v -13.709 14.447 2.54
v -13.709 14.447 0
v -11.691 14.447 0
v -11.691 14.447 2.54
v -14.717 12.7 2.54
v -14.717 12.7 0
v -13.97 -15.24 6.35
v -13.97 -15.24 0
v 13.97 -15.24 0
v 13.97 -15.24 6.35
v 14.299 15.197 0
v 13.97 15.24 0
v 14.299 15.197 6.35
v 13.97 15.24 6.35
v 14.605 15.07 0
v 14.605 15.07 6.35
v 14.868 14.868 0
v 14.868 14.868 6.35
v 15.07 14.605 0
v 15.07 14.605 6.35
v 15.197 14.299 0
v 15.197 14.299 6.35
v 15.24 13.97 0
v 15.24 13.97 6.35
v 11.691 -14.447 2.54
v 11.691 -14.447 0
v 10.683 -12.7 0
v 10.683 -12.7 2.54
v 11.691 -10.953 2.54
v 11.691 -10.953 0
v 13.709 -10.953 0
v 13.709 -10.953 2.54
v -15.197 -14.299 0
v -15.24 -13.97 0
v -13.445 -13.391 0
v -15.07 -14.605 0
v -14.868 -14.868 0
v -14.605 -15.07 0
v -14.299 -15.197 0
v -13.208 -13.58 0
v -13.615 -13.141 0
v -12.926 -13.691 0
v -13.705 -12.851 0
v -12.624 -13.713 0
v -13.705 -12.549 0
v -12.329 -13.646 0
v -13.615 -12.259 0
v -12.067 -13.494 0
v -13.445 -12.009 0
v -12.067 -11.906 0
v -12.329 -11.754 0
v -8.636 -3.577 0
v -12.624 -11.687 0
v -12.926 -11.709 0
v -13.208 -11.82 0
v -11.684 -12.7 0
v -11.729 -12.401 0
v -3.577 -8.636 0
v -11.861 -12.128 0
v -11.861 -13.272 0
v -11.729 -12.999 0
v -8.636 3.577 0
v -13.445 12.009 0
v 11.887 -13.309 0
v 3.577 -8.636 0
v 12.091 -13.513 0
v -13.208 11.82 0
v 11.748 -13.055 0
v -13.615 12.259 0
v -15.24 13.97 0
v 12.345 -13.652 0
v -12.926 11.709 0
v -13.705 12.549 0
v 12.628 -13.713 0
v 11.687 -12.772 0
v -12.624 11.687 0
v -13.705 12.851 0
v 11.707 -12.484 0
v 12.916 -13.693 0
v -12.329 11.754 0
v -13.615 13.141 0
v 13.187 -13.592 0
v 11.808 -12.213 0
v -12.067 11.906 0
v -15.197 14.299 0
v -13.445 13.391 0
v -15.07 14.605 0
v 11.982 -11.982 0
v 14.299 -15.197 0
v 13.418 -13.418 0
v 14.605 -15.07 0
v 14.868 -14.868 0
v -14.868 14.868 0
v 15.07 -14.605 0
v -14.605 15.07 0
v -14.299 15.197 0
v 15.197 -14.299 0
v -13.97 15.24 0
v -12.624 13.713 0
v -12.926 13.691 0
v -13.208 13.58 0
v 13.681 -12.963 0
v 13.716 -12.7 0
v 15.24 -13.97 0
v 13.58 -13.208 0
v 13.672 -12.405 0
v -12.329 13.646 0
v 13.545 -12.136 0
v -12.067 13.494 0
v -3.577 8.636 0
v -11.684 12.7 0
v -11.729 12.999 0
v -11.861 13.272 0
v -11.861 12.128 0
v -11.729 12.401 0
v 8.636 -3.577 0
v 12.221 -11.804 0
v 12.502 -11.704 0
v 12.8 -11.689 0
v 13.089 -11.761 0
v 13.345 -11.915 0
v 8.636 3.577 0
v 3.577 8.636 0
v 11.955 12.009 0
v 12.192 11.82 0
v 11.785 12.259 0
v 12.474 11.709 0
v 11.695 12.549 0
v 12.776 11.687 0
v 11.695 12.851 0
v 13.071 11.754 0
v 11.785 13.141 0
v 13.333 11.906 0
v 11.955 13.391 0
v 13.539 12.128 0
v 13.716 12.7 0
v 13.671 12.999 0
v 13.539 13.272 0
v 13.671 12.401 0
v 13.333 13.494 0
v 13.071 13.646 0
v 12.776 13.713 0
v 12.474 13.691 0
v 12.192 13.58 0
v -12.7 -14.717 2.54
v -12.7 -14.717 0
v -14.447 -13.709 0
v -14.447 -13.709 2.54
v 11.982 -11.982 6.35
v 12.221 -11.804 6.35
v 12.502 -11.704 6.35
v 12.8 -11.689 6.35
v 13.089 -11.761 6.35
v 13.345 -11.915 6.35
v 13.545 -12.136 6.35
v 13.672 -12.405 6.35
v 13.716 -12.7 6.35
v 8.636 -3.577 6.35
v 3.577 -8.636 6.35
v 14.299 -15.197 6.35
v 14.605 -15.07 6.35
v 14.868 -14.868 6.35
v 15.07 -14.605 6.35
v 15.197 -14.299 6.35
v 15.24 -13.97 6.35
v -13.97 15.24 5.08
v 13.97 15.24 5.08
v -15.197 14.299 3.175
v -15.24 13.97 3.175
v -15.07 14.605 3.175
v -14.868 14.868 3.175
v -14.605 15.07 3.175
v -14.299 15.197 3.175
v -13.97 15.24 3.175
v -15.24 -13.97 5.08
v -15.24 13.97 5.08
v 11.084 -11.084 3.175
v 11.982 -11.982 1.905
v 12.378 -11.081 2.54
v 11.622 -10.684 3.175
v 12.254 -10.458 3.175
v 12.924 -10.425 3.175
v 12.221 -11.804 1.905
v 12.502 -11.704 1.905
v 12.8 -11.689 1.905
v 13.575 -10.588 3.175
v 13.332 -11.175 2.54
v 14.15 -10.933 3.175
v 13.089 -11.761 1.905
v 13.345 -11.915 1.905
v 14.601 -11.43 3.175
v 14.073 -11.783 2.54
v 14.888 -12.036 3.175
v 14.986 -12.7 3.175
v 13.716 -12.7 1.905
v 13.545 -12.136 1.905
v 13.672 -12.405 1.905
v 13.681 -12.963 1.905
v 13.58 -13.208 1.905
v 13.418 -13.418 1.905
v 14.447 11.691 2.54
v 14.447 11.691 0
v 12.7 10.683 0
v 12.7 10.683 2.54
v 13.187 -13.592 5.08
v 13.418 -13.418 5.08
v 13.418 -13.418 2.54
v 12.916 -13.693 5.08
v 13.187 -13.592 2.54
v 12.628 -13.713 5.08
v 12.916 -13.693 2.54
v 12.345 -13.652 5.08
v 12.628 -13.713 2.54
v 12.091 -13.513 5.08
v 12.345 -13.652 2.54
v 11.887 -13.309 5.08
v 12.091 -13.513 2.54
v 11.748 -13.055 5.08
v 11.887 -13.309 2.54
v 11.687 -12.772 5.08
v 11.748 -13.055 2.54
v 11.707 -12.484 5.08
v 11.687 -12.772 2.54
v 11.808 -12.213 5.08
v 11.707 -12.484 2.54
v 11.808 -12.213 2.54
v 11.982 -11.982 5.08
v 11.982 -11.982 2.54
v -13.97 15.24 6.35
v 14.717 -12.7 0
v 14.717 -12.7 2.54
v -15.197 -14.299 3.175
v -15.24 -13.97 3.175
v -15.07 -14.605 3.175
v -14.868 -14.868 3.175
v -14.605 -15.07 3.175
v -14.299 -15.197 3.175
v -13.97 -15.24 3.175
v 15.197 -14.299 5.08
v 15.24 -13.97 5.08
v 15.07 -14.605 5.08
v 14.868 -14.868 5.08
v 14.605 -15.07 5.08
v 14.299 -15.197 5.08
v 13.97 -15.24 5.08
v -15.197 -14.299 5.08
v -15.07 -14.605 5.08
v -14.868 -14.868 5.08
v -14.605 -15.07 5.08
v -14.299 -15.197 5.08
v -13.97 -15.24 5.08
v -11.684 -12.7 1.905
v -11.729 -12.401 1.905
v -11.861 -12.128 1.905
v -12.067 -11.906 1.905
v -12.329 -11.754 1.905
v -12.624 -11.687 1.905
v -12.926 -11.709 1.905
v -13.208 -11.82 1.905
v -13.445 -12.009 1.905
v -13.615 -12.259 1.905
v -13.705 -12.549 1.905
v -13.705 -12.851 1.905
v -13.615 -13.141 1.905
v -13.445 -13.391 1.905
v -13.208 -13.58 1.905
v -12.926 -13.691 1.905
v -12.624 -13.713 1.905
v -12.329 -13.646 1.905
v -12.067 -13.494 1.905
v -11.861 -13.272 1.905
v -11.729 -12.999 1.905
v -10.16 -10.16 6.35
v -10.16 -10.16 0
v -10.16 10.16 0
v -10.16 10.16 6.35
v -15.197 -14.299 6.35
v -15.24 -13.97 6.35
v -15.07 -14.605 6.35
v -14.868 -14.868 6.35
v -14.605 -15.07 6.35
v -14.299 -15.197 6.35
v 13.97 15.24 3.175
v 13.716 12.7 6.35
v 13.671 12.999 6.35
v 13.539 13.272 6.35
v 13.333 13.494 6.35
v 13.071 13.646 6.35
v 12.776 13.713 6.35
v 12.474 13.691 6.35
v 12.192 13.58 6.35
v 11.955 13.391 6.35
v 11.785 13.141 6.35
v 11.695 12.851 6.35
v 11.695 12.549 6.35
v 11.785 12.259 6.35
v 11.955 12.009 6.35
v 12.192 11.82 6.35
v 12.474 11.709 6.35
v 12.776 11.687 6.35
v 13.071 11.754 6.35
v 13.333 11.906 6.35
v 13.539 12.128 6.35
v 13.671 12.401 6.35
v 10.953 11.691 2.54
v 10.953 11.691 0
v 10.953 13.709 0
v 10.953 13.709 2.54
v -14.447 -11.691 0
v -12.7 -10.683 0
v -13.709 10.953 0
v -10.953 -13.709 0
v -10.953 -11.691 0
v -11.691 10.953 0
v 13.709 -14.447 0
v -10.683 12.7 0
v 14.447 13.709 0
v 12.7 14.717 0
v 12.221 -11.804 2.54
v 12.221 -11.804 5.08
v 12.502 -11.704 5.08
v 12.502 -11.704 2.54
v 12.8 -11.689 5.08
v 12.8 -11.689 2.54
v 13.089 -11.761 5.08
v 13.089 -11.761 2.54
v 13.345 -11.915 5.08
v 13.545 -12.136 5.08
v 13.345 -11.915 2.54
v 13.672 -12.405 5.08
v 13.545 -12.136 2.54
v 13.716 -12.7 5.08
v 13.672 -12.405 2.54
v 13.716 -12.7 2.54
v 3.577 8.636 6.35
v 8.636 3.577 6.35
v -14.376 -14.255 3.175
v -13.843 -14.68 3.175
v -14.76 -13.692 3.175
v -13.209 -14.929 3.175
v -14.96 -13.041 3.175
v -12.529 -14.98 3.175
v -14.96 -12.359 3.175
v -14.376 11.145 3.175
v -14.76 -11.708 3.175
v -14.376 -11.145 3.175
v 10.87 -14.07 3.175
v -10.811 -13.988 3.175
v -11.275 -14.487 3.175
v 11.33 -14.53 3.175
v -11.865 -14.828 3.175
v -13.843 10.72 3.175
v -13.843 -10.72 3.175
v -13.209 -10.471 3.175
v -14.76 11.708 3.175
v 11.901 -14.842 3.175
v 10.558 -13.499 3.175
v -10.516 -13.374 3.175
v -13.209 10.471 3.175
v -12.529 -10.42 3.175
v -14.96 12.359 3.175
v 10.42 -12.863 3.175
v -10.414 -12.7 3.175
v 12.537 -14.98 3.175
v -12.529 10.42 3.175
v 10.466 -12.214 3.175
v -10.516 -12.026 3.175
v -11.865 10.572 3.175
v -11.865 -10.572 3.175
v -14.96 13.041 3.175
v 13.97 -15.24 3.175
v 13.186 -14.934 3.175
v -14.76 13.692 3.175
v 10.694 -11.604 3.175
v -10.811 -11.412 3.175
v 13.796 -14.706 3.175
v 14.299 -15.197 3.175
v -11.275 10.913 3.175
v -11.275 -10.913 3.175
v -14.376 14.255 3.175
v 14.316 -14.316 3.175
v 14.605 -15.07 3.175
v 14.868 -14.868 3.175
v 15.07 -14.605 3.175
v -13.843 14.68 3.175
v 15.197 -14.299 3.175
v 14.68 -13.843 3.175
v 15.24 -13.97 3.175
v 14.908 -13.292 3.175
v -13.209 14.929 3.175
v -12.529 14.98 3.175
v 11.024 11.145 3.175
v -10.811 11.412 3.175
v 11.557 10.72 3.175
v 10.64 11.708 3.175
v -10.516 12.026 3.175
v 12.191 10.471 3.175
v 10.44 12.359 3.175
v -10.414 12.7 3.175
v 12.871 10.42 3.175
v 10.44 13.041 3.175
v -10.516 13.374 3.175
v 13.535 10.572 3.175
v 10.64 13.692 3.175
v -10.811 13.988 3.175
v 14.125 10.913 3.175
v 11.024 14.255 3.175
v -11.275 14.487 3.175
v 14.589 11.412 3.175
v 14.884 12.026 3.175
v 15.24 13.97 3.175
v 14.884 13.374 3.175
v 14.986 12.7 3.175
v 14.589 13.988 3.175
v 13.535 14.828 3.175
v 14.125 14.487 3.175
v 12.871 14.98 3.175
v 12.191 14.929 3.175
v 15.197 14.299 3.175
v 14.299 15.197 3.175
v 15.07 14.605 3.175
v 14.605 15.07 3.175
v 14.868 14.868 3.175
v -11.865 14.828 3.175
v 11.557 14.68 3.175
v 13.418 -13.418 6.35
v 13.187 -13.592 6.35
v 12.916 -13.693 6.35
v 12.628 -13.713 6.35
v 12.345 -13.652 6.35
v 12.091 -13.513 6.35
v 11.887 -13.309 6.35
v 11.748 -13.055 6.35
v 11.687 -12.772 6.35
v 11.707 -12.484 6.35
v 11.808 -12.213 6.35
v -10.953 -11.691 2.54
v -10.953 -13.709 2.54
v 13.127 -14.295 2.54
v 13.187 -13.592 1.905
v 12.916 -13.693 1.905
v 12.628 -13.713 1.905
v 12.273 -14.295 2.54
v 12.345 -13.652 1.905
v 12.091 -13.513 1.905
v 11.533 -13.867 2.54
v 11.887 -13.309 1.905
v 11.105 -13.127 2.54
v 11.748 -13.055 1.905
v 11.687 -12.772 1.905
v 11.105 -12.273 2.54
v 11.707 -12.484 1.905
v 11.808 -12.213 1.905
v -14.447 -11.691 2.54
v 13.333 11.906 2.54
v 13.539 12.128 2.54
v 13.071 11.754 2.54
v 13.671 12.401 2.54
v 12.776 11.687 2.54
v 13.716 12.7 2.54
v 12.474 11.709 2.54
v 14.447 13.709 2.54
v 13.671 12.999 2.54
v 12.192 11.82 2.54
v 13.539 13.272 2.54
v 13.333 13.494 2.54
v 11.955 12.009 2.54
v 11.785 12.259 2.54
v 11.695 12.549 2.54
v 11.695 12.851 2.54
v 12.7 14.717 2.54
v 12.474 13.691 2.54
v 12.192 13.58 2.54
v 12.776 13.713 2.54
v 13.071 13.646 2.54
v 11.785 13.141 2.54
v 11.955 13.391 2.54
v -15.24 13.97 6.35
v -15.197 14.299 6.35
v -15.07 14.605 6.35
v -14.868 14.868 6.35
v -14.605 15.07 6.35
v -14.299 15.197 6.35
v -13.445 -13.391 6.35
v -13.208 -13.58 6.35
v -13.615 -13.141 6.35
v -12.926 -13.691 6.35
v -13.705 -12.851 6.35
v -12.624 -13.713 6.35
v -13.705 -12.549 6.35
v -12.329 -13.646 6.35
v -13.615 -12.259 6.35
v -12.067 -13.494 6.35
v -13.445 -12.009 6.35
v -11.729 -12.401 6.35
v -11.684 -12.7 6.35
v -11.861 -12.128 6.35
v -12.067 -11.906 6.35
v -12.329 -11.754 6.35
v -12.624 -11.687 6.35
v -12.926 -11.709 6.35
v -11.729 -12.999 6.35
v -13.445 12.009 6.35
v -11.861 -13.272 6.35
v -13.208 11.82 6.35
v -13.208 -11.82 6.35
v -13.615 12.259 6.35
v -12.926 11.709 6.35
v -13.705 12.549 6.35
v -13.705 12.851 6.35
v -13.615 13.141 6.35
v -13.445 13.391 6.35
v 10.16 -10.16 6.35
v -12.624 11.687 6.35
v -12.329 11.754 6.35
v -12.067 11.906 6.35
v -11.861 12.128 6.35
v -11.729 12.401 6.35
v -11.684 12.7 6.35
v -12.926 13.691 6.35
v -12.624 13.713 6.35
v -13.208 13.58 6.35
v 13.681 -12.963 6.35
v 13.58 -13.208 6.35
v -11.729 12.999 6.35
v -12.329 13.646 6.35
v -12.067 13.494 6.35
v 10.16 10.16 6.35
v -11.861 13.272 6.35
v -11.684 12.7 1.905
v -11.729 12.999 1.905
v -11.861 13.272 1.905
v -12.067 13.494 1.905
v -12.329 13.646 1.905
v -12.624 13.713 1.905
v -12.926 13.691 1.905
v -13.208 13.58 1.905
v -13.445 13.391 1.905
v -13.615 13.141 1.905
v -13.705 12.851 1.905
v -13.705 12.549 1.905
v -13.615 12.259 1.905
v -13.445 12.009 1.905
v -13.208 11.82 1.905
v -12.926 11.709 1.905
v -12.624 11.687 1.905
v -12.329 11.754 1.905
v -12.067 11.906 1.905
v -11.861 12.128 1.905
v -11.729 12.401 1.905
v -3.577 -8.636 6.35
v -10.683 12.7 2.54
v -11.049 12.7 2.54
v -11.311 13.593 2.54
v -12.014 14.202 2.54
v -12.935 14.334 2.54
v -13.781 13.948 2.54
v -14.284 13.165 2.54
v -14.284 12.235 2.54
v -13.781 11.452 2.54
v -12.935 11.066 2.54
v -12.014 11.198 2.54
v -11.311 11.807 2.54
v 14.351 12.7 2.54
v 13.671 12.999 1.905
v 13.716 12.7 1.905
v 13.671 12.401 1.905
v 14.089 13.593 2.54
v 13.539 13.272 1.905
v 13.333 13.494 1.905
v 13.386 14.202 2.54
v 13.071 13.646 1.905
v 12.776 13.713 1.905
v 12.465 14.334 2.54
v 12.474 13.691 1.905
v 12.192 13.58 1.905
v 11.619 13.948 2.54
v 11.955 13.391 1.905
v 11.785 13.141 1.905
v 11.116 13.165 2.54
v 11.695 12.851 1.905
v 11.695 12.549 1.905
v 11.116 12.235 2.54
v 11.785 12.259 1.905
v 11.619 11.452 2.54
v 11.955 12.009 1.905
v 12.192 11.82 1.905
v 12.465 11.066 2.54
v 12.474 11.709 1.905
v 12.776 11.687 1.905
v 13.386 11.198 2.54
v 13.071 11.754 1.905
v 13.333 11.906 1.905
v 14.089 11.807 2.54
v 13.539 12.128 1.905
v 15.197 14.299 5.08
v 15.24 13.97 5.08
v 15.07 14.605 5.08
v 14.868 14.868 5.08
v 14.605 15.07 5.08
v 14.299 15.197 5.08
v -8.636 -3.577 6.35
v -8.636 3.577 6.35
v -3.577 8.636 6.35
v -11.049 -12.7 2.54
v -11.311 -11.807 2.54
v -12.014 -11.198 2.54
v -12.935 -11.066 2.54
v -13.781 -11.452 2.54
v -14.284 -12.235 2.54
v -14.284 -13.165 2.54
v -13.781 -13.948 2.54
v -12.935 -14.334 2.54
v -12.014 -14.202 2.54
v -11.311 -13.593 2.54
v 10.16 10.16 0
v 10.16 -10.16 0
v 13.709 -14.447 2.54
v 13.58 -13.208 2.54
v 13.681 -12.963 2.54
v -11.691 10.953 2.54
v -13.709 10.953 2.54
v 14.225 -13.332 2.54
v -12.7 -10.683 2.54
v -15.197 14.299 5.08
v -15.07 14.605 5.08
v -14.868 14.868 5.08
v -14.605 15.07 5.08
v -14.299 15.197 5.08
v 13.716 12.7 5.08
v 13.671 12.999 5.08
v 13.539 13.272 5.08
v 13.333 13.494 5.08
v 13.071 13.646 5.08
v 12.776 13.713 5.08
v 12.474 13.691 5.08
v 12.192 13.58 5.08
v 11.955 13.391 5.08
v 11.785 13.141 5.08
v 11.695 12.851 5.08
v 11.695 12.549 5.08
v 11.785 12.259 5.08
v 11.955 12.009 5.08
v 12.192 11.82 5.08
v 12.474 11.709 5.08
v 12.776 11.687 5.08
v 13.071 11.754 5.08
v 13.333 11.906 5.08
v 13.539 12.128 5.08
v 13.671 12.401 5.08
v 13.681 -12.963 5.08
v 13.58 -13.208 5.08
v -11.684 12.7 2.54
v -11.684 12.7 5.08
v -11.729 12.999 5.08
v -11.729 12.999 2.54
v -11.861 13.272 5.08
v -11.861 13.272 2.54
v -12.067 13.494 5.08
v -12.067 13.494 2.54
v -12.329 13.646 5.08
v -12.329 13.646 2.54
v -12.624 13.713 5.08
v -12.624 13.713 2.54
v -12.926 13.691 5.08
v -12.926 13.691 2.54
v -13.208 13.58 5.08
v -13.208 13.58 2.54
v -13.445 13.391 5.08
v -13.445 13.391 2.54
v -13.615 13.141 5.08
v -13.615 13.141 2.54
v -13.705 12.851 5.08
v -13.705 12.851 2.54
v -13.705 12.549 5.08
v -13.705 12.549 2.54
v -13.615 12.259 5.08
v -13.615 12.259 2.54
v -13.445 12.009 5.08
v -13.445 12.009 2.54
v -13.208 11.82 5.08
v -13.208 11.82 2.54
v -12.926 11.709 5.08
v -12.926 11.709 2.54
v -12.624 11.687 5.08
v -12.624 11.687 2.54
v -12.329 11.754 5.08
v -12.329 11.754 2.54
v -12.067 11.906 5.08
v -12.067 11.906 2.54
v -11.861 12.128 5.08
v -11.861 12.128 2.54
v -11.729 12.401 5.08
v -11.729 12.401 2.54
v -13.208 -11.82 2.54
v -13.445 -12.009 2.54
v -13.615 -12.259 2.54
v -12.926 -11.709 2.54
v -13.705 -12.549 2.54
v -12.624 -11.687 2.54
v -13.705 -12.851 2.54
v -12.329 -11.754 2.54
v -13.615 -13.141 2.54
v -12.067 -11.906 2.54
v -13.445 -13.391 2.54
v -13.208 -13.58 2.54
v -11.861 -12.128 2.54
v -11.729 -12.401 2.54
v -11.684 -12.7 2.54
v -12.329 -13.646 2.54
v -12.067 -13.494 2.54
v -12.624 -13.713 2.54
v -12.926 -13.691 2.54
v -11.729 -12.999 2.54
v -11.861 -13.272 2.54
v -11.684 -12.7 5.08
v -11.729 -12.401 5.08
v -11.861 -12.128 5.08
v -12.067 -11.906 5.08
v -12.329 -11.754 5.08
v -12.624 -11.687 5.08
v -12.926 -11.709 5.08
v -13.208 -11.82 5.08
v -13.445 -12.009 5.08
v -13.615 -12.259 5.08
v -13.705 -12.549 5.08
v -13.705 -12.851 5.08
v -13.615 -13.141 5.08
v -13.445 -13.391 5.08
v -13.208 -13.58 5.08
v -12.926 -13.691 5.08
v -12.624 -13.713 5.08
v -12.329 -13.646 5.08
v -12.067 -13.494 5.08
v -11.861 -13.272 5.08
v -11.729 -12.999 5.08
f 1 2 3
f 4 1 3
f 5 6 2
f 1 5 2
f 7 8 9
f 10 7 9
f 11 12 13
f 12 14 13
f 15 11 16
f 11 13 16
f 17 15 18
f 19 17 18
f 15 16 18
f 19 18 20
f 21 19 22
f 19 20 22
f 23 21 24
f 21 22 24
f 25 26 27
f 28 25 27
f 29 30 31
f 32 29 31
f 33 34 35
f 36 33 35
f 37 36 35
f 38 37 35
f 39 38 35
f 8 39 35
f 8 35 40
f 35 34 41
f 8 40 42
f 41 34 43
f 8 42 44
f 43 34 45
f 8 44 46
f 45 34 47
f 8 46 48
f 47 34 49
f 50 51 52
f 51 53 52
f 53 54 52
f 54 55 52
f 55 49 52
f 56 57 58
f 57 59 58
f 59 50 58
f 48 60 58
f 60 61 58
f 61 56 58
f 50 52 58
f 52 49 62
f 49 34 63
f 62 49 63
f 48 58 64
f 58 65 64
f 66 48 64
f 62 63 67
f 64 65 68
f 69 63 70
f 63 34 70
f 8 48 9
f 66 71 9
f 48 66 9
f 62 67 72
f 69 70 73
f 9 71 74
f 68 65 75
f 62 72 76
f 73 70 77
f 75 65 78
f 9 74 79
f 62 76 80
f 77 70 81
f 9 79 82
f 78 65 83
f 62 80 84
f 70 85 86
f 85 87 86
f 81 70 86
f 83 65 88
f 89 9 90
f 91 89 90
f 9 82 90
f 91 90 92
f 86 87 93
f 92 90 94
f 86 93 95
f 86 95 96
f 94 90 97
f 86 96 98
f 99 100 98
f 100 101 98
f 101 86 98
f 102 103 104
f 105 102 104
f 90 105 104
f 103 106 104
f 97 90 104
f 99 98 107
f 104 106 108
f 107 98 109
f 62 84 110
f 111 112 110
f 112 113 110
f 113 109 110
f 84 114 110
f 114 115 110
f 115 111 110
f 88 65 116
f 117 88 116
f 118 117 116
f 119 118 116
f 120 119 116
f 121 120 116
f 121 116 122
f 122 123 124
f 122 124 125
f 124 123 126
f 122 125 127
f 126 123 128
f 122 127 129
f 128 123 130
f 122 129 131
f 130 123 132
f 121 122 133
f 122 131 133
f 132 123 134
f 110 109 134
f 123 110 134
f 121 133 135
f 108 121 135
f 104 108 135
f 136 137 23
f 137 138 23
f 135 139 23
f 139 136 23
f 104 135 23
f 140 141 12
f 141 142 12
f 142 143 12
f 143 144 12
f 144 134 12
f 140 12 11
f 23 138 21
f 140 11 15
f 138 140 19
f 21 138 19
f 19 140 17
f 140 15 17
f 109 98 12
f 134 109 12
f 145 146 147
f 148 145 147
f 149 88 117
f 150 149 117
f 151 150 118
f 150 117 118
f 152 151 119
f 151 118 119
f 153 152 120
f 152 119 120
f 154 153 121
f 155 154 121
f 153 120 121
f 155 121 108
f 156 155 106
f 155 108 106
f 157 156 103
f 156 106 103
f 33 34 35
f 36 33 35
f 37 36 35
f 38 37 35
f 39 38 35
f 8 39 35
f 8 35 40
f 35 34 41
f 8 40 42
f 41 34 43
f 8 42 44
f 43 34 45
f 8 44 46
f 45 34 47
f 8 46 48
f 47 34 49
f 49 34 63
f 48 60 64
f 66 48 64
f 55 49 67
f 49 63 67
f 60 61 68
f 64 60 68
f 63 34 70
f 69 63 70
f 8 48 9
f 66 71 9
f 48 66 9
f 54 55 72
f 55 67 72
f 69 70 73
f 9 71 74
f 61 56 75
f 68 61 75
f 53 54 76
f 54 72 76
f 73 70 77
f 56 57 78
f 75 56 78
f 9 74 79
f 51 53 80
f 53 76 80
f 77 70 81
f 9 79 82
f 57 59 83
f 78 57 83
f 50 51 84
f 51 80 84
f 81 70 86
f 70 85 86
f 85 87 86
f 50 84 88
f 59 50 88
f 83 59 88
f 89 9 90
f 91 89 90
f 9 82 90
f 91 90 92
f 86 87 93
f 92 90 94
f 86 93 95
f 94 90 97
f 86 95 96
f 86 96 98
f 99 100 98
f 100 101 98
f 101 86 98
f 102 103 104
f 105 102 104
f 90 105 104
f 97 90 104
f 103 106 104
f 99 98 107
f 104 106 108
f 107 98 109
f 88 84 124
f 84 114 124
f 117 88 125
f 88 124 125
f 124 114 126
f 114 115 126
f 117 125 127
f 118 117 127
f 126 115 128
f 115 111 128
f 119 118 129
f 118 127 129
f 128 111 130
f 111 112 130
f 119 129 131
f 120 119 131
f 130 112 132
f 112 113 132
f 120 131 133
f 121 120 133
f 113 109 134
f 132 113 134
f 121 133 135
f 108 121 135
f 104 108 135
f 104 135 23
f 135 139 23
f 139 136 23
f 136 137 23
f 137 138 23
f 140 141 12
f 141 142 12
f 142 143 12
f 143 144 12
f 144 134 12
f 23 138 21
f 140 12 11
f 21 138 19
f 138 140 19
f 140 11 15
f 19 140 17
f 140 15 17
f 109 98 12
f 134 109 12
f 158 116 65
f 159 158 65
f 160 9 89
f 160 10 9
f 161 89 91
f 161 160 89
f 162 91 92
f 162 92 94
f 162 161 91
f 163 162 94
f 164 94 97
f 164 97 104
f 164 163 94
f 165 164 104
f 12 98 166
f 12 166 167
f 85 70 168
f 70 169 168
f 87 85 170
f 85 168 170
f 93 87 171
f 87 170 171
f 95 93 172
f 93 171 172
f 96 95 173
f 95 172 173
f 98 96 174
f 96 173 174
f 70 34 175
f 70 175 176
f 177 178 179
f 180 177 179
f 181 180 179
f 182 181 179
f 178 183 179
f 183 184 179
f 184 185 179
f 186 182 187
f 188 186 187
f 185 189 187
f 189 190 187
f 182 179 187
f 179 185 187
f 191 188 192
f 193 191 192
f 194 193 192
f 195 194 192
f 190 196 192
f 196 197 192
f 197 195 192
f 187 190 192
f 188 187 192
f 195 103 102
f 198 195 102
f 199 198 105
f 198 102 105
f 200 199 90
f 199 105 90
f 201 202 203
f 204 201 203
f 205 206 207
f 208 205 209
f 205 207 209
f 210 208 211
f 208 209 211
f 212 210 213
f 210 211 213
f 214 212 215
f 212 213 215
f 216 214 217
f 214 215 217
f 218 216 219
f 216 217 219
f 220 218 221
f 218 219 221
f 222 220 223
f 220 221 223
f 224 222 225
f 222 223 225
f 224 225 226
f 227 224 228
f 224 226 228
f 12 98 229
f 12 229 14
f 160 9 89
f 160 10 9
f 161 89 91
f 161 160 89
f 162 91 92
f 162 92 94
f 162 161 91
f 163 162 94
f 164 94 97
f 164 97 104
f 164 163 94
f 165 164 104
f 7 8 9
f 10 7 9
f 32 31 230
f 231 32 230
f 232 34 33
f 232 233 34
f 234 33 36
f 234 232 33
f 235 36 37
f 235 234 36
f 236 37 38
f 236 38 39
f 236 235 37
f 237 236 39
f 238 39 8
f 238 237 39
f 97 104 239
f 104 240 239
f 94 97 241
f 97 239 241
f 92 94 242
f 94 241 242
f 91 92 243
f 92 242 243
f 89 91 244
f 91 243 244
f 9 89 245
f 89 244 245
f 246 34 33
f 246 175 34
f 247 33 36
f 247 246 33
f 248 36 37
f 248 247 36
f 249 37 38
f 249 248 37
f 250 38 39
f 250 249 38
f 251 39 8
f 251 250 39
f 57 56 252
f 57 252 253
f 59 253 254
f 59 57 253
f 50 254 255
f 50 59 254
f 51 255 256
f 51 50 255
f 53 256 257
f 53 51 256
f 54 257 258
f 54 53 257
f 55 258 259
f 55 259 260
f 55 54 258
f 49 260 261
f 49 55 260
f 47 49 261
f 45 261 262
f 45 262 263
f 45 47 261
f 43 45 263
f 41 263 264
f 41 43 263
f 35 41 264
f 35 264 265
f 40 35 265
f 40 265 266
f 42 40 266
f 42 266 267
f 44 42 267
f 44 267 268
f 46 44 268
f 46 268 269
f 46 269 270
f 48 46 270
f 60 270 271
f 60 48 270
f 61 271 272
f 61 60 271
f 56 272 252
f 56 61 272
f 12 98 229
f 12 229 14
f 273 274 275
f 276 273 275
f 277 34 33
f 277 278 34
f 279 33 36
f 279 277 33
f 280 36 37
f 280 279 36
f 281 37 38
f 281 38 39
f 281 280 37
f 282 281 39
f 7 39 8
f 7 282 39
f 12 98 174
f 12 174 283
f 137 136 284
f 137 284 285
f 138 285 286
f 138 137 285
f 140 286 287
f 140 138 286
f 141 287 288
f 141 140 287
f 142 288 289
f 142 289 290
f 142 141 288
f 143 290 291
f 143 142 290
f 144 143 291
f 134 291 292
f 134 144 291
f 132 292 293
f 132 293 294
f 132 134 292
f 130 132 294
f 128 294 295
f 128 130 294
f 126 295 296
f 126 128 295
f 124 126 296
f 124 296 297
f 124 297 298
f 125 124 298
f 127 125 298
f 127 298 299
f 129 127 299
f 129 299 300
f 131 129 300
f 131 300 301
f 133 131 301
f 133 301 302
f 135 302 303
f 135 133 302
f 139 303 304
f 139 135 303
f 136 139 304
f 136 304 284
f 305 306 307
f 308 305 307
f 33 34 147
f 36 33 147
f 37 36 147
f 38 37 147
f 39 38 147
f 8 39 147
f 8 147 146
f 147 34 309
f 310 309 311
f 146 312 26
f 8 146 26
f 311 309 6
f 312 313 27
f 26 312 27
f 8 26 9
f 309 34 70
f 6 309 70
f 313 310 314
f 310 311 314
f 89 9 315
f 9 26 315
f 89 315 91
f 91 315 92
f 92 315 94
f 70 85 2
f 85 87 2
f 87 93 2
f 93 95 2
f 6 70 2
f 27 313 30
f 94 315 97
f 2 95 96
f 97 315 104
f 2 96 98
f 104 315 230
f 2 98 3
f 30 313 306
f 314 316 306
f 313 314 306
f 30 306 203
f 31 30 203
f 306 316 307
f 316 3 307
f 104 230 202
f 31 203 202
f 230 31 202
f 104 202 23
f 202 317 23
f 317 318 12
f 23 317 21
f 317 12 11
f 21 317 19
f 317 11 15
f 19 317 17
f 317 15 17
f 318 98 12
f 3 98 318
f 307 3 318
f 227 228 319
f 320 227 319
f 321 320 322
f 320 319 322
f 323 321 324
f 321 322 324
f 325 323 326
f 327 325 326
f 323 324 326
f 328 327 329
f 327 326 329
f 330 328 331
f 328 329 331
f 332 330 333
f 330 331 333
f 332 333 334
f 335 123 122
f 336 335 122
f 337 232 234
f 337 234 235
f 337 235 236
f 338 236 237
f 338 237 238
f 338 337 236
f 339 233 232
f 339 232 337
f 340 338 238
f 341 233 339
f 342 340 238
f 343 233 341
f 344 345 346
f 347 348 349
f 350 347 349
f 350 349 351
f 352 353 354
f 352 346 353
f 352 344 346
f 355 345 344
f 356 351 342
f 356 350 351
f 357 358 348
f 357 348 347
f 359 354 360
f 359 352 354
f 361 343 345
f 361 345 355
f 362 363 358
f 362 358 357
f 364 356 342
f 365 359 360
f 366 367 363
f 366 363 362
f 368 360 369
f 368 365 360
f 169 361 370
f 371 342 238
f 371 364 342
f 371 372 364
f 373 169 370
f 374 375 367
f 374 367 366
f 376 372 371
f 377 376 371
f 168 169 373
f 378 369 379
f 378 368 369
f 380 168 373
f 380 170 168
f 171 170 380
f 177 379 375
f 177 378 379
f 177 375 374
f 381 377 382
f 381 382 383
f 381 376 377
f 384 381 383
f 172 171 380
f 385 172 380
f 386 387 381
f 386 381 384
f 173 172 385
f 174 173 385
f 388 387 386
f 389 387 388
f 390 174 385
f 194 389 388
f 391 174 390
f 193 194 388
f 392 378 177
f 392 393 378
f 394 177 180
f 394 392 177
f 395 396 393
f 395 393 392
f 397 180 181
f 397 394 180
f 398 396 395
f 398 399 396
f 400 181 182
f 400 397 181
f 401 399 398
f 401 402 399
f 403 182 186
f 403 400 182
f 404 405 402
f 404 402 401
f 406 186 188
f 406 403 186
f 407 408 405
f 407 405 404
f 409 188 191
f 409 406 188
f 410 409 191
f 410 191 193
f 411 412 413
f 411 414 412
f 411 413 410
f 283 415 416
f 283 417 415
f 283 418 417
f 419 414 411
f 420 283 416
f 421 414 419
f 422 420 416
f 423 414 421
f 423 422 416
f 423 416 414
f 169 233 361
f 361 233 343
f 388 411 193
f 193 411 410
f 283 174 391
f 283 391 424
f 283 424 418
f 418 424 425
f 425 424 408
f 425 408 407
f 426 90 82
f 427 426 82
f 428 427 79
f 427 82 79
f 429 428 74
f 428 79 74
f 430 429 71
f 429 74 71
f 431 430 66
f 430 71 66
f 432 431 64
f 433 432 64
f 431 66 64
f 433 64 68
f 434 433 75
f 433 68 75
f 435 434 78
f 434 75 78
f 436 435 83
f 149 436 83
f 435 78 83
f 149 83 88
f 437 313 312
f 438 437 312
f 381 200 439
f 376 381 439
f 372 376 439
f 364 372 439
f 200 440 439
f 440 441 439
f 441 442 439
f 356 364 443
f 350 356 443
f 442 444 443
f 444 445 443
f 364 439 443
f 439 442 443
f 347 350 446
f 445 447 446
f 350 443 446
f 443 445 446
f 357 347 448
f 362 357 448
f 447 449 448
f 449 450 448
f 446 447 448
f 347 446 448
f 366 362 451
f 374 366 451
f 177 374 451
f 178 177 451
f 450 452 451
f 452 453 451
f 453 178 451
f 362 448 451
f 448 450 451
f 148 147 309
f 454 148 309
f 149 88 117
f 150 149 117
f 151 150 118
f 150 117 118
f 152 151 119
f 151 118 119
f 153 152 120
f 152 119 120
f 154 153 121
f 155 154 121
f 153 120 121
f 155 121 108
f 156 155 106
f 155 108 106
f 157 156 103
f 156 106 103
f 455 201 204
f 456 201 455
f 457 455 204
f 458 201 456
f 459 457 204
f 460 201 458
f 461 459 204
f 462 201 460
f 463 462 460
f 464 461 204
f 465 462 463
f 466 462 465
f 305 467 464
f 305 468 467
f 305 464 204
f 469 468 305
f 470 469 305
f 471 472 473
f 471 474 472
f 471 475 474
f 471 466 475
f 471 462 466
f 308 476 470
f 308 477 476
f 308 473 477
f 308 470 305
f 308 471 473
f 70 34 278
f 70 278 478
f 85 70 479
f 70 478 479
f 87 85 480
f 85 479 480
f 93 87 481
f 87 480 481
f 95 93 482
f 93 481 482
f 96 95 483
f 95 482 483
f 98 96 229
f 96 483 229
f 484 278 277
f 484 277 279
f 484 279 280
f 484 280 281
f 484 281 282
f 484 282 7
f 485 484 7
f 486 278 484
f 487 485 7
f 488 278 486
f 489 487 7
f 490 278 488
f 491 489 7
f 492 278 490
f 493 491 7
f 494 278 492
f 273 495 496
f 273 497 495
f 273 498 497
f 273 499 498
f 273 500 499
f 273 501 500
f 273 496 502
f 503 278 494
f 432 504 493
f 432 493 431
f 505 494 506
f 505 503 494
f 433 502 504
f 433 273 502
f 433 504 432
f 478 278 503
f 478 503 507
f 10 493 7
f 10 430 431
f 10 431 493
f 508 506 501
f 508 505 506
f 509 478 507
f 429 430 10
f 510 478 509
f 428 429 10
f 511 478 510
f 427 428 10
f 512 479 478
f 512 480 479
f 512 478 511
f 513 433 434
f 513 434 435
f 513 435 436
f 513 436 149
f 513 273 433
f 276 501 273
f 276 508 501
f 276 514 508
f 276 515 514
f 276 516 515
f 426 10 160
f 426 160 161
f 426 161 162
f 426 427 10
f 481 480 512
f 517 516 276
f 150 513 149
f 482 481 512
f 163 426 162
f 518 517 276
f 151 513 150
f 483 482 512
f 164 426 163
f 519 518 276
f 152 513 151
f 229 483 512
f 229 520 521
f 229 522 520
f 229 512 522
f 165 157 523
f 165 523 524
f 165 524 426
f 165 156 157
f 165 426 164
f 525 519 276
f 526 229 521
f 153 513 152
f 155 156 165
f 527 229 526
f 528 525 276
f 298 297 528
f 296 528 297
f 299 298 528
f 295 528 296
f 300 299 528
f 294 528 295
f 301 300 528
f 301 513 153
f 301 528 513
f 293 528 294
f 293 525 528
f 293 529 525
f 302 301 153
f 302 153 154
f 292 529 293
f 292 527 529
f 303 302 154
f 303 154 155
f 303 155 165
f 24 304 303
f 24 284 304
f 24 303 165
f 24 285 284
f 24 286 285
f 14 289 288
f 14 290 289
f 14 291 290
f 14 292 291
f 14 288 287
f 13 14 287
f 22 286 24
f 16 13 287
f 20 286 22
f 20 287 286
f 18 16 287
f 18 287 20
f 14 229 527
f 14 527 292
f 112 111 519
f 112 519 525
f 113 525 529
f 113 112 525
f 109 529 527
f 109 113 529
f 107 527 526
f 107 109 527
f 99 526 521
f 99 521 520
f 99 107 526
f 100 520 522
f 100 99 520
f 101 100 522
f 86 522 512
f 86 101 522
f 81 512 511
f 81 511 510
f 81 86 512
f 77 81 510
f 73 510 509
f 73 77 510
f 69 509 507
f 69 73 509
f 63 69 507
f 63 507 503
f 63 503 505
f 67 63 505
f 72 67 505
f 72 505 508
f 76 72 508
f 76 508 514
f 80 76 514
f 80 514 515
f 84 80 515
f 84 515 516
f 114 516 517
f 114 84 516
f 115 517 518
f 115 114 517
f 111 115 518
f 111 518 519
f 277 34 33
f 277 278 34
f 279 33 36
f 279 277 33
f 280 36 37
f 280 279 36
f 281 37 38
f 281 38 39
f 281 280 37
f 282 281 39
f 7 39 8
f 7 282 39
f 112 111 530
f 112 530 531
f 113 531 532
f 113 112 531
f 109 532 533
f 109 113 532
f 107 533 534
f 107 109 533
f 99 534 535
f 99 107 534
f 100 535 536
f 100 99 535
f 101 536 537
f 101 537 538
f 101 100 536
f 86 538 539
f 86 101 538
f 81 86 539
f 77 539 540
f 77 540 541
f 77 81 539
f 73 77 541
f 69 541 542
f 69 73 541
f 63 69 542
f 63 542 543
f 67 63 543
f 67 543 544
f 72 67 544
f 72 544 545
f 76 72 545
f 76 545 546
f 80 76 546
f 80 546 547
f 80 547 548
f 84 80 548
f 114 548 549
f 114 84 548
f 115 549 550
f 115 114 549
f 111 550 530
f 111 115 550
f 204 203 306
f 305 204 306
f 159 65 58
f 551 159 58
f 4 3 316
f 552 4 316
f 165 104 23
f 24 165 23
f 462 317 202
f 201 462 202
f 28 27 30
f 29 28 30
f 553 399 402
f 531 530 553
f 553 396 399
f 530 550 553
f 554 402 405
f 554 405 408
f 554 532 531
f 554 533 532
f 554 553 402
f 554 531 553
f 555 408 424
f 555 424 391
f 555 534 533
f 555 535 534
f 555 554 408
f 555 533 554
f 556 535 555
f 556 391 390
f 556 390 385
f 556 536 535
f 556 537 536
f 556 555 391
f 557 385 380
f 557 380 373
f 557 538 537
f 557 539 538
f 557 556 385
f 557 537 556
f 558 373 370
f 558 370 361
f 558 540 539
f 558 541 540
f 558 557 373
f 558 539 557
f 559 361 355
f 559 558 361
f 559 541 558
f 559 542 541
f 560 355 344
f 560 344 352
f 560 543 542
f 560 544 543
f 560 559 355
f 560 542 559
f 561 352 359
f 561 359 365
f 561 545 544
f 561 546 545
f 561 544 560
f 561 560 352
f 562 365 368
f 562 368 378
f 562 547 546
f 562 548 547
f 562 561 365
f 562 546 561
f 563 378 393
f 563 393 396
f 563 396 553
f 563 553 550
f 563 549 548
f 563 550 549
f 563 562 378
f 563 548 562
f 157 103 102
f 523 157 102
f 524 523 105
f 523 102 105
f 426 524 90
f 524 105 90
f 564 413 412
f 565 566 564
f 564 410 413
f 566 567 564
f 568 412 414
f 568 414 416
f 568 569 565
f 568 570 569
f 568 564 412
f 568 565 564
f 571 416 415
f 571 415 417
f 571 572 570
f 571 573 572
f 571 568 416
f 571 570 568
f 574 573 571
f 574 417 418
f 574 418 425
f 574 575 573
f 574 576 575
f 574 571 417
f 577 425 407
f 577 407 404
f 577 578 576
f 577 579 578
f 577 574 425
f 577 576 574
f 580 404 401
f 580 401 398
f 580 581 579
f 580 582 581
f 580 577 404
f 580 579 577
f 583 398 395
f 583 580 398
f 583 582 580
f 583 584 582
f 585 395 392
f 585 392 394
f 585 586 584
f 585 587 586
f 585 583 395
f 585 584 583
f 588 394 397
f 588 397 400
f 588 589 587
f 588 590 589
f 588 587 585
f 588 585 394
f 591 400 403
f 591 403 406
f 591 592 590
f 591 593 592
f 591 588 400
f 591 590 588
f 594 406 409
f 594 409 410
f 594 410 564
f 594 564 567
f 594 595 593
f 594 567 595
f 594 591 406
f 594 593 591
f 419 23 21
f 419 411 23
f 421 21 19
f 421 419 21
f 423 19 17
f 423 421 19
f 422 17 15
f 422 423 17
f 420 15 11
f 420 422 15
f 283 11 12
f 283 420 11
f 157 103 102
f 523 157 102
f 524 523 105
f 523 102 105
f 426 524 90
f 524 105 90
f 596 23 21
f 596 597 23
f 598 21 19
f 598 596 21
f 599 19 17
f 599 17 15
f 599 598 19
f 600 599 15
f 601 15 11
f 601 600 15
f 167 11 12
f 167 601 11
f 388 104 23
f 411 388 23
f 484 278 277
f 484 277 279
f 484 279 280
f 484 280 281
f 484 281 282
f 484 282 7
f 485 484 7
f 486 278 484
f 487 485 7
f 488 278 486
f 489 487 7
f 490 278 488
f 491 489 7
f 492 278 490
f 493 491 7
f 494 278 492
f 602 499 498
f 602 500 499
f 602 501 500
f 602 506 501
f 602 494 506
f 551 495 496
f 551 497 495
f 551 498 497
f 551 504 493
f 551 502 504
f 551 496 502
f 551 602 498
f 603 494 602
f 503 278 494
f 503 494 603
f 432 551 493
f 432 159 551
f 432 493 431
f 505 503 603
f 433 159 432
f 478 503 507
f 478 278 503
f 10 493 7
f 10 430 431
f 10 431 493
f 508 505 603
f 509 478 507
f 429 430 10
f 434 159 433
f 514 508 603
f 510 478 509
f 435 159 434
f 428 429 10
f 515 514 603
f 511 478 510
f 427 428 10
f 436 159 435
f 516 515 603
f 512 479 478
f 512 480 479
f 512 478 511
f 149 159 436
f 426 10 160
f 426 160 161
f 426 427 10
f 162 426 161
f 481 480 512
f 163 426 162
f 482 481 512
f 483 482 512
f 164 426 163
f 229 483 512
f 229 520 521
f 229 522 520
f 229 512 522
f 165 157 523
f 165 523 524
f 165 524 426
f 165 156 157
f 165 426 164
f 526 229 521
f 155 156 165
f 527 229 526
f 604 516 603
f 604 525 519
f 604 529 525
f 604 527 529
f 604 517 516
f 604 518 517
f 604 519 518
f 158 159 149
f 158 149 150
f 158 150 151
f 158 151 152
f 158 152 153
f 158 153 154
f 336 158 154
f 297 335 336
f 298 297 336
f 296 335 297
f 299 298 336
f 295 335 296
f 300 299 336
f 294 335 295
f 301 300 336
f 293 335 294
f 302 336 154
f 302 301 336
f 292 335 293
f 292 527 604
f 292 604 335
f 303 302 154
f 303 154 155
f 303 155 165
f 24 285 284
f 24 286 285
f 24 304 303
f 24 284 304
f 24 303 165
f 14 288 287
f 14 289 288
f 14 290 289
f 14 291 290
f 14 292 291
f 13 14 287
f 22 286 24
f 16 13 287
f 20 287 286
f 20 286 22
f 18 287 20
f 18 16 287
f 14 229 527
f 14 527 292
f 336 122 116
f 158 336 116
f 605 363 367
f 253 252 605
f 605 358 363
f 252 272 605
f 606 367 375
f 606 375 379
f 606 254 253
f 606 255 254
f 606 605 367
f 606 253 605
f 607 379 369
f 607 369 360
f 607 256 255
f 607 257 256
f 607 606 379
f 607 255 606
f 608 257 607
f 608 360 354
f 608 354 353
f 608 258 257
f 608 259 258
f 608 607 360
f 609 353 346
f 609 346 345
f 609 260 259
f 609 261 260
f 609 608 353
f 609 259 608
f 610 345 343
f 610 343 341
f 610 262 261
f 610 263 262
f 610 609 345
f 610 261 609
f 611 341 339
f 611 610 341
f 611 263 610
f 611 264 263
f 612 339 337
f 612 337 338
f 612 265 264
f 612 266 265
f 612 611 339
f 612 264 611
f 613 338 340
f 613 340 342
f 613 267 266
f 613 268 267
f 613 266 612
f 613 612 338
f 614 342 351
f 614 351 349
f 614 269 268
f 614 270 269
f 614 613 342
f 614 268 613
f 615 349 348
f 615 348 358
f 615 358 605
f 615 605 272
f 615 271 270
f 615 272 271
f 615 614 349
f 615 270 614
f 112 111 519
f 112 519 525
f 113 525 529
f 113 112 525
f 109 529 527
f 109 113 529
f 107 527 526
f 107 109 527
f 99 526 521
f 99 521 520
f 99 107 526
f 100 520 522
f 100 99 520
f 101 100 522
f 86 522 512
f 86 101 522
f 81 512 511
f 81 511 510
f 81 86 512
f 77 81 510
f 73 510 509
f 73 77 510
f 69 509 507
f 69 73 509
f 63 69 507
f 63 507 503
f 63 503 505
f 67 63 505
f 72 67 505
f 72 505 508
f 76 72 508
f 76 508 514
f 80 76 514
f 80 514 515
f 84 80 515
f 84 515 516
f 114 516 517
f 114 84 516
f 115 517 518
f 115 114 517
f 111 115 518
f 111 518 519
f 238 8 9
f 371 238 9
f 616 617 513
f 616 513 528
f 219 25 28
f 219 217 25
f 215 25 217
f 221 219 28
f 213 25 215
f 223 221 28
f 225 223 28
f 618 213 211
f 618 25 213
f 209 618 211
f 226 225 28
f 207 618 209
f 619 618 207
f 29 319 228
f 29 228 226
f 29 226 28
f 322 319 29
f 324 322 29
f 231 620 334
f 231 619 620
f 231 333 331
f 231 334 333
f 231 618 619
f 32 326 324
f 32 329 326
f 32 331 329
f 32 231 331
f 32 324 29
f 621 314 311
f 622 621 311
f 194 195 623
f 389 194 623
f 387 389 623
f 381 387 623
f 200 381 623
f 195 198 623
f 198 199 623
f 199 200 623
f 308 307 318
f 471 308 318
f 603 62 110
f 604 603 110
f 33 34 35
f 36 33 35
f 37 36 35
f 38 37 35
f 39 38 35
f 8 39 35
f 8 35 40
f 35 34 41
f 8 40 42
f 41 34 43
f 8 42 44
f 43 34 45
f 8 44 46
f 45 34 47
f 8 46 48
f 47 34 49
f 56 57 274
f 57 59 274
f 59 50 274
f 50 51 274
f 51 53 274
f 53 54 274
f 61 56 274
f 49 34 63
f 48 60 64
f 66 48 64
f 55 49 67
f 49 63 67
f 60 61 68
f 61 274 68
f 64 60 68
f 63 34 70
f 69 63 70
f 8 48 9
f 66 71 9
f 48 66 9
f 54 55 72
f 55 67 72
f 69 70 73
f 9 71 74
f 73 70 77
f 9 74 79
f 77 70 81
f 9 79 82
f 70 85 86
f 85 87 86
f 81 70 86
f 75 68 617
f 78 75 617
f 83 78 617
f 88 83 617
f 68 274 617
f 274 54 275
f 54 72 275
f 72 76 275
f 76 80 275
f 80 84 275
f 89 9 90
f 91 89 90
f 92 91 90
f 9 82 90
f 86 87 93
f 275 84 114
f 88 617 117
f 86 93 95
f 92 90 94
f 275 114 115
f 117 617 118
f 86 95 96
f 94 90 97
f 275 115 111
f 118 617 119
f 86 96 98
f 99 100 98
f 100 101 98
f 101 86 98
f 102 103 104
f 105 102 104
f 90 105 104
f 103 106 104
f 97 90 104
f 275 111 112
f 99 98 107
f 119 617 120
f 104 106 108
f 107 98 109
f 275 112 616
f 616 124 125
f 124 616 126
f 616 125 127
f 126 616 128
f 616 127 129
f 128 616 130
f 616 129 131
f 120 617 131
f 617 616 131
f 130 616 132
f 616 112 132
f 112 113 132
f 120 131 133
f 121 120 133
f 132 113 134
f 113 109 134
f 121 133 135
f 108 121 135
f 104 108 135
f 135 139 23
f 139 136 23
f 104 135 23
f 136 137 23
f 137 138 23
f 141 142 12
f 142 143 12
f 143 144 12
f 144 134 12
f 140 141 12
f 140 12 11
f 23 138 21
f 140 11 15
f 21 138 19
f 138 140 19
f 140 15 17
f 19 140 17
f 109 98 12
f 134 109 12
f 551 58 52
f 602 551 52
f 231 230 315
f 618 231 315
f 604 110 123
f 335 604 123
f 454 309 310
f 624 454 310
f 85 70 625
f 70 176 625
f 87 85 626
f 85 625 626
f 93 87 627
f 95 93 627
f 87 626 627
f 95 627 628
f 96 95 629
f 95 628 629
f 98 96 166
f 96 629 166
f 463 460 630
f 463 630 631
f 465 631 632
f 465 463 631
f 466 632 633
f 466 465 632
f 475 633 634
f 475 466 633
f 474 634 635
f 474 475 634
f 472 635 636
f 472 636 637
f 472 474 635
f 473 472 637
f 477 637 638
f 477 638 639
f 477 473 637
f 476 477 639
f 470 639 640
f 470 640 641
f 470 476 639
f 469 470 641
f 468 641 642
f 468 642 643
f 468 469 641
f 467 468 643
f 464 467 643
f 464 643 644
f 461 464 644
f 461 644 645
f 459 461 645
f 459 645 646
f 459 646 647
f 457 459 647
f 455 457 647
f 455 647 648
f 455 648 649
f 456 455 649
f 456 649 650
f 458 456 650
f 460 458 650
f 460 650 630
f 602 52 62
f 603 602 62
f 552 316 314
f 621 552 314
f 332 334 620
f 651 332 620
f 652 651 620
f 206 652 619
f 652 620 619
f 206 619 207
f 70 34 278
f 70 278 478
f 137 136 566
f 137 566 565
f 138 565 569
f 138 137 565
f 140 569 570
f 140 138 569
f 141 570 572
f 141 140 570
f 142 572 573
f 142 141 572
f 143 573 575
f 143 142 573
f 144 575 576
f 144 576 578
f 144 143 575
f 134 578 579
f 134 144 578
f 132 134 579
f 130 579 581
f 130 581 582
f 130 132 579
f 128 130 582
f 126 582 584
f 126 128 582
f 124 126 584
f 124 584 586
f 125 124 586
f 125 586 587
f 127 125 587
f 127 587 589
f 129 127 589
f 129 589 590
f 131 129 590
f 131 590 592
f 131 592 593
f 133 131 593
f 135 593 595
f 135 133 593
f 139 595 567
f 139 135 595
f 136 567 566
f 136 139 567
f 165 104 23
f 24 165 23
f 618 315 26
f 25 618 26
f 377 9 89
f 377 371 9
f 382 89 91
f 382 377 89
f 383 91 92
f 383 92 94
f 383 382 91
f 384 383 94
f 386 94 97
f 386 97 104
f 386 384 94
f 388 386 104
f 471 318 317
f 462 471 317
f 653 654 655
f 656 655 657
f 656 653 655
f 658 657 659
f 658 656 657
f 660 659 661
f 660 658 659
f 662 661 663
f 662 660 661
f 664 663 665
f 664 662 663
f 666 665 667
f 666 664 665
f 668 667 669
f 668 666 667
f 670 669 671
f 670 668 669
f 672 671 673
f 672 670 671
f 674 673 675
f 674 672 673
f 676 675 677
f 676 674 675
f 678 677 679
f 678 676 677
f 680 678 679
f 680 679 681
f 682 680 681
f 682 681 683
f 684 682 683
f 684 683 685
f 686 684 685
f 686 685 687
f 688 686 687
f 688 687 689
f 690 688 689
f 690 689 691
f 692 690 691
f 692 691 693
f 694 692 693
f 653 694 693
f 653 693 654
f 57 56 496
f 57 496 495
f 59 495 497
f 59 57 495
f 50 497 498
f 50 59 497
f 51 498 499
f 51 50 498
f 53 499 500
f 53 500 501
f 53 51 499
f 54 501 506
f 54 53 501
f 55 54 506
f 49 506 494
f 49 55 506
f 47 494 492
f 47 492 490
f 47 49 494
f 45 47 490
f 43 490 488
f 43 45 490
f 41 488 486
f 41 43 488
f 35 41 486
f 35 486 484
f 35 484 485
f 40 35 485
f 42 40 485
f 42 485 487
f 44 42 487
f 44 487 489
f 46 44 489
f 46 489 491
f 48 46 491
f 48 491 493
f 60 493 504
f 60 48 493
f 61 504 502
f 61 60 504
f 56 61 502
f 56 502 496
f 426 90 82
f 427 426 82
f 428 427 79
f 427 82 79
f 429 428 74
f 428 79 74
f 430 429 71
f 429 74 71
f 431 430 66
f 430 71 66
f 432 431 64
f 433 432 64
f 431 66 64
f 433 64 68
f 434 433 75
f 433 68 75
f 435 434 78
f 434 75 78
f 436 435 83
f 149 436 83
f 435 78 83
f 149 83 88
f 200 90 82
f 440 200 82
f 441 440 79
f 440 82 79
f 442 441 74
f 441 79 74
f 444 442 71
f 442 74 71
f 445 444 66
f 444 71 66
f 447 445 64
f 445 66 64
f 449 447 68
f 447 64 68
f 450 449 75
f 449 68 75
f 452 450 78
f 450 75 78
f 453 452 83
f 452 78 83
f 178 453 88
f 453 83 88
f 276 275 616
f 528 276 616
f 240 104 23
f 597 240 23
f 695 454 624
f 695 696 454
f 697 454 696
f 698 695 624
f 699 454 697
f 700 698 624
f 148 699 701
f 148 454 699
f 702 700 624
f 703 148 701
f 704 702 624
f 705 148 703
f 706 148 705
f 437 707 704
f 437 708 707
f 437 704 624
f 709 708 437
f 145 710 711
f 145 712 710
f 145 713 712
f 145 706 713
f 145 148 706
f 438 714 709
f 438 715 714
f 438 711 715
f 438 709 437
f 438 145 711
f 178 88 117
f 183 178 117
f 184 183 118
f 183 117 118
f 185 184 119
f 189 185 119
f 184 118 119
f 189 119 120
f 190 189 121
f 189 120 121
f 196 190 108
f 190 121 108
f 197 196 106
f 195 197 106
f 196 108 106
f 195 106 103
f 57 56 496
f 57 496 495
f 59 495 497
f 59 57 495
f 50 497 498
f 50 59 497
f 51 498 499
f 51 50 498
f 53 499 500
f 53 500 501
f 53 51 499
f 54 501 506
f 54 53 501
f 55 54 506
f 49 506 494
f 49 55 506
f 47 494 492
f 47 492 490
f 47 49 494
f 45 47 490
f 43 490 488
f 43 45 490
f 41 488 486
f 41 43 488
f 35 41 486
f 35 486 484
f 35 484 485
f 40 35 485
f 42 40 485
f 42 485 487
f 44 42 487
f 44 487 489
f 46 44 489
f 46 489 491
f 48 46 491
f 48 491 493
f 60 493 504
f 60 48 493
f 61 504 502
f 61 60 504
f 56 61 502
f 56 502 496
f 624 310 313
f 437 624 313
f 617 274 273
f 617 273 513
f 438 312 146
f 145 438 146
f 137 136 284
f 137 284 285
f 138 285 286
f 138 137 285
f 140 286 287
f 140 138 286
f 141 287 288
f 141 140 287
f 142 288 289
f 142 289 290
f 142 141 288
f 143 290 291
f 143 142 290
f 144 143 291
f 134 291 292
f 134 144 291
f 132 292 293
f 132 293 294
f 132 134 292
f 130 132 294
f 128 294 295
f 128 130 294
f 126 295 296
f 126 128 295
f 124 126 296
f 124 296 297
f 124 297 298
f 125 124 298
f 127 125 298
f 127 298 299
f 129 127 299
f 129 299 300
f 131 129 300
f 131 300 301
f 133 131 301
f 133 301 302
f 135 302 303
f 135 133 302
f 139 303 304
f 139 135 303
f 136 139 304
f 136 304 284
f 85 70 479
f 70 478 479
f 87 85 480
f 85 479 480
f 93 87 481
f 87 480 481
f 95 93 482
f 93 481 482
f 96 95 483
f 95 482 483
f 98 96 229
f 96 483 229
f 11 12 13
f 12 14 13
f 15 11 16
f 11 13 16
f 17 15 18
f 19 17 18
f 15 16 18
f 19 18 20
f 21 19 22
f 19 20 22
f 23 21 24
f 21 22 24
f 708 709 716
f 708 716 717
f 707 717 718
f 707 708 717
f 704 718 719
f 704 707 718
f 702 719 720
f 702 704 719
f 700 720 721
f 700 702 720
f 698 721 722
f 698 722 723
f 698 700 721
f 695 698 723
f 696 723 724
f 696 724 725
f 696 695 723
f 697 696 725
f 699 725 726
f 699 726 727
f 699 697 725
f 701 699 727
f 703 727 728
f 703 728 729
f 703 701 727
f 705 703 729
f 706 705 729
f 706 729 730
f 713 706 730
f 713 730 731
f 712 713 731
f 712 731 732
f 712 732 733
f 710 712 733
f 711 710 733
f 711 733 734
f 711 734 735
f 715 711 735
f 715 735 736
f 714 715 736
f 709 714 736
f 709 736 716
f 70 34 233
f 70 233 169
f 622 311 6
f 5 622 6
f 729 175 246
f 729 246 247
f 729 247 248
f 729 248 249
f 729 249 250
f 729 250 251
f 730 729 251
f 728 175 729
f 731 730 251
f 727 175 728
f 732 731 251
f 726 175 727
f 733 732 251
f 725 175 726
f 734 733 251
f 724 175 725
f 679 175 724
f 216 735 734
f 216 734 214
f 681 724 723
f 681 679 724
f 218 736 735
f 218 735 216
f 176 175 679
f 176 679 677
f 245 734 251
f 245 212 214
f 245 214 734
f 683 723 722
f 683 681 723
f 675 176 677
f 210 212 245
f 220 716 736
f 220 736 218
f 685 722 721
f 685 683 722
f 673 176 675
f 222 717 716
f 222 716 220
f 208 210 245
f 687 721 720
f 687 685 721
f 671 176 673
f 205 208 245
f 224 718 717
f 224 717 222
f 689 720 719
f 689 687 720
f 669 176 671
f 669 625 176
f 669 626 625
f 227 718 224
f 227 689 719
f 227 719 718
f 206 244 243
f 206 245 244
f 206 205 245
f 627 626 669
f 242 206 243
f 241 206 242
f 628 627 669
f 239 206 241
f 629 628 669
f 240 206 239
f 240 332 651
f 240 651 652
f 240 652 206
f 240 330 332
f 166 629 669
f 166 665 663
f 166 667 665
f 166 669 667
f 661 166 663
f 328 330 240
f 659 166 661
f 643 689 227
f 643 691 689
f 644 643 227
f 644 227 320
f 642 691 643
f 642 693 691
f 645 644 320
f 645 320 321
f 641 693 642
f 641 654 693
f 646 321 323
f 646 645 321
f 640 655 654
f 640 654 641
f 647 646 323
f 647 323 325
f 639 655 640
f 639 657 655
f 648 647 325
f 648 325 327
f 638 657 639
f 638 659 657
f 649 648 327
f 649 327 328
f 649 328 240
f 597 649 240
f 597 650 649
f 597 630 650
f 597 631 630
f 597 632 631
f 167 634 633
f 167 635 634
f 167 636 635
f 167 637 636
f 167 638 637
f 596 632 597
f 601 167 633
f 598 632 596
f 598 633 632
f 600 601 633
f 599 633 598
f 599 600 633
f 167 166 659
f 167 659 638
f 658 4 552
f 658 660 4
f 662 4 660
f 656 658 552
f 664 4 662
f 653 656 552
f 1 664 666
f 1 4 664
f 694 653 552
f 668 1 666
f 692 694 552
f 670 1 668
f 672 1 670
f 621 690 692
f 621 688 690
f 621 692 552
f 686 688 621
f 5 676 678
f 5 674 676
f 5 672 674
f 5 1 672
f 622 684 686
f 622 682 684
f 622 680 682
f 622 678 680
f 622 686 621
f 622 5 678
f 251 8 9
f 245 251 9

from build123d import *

# Parameters (mm, degrees)
F1_W      = 30.48
F1_H      = 30.48
F1_R      = 1.016
F1_W_2    = 20.32
F1_H_2    = 20.32
F2_DEPTH  = 6.35
F3_R      = 1.27
F4_DEPTH  = 6.35
F5_R      = 1.27
F6_DEPTH  = 3.175
F7_R      = 1.27
F8_DEPTH  = 5.08
F9_R      = 1.016
F10_DEPTH = 2.54
F11_COUNT = 4
F11_ANGLE = 810
F13_R     = 1.27
F14_SIZE  = 1.27


with BuildPart() as f2:
    # F1 (on Top) → F2 (new body)
    with BuildSketch(Plane.XY):
        Rectangle(F1_W, F1_H)
        with Locations((-12.7, -12.7)):
            Circle(F1_R, mode=Mode.SUBTRACT)
        with BuildLine():
            ThreePointArc((13.4184204897, -13.4184204897), (11.9815795103, -13.4184204897), (11.9815795103, -11.9815795103))
            ThreePointArc((11.9815795103, -11.9815795103), (13.0888063673, -11.761338395), (13.716, -12.7))
            ThreePointArc((13.716, -12.7), (13.638661605, -13.0888063673), (13.4184204897, -13.4184204897))
        make_face(mode=Mode.SUBTRACT)
        with Locations((-12.7, 12.7)):
            Circle(F1_R, mode=Mode.SUBTRACT)
        Rectangle(F1_W_2, F1_H_2, mode=Mode.SUBTRACT)
        with Locations((12.7, 12.7)):
            Circle(F1_R, mode=Mode.SUBTRACT)
        Rectangle(F1_W_2, F1_H_2)
        Polygon((-3.5771483247, -8.636), (-8.636, -3.5771483247), (-8.636, 3.5771483247), (-3.5771483247, 8.636), (3.5771483247, 8.636), (8.636, 3.5771483247), (8.636, -3.5771483247), (3.5771483247, -8.636), align=None, mode=Mode.SUBTRACT)
    extrude(amount=F2_DEPTH)

    # F3
    f3_edges = [f2.edges().sort_by_distance(p)[0] for p in [
        (-15.24, 15.24, 3.175),
        (-15.24, -15.24, 3.175),
        (15.24, 15.24, 3.175),
        (15.24, -15.24, 3.175),
    ]]
    fillet(f3_edges, radius=F3_R)


with BuildPart() as f4:
    # F1 (on Top) → F4 (new body)
    with BuildSketch(Plane.XY):
        Rectangle(F1_W, F1_H)
        with Locations((-12.7, -12.7)):
            Circle(F1_R, mode=Mode.SUBTRACT)
        with BuildLine():
            ThreePointArc((13.4184204897, -13.4184204897), (11.9815795103, -13.4184204897), (11.9815795103, -11.9815795103))
            ThreePointArc((11.9815795103, -11.9815795103), (13.0888063673, -11.761338395), (13.716, -12.7))
            ThreePointArc((13.716, -12.7), (13.638661605, -13.0888063673), (13.4184204897, -13.4184204897))
        make_face(mode=Mode.SUBTRACT)
        with Locations((-12.7, 12.7)):
            Circle(F1_R, mode=Mode.SUBTRACT)
        Rectangle(F1_W_2, F1_H_2, mode=Mode.SUBTRACT)
        with Locations((12.7, 12.7)):
            Circle(F1_R, mode=Mode.SUBTRACT)
    extrude(amount=F4_DEPTH)

    # F5
    f5_edges = [f4.edges().sort_by_distance(p)[0] for p in [
        (15.24, 15.24, 3.175),
        (15.24, -15.24, 3.175),
        (-15.24, 15.24, 3.175),
        (-15.24, -15.24, 3.175),
    ]]
    fillet(f5_edges, radius=F5_R)


with BuildPart() as f6:
    # F1 (on Top) → F6 (new body)
    with BuildSketch(Plane.XY):
        Rectangle(F1_W, F1_H)
        with Locations((-12.7, -12.7)):
            Circle(F1_R, mode=Mode.SUBTRACT)
        with BuildLine():
            ThreePointArc((13.4184204897, -13.4184204897), (11.9815795103, -13.4184204897), (11.9815795103, -11.9815795103))
            ThreePointArc((11.9815795103, -11.9815795103), (13.0888063673, -11.761338395), (13.716, -12.7))
            ThreePointArc((13.716, -12.7), (13.638661605, -13.0888063673), (13.4184204897, -13.4184204897))
        make_face(mode=Mode.SUBTRACT)
        with Locations((-12.7, 12.7)):
            Circle(F1_R, mode=Mode.SUBTRACT)
        Rectangle(F1_W_2, F1_H_2, mode=Mode.SUBTRACT)
        with Locations((12.7, 12.7)):
            Circle(F1_R, mode=Mode.SUBTRACT)
        Rectangle(F1_W_2, F1_H_2)
        Polygon((-3.5771483247, -8.636), (-8.636, -3.5771483247), (-8.636, 3.5771483247), (-3.5771483247, 8.636), (3.5771483247, 8.636), (8.636, 3.5771483247), (8.636, -3.5771483247), (3.5771483247, -8.636), align=None, mode=Mode.SUBTRACT)
        Polygon((-8.636, 3.5771483247), (-8.636, -3.5771483247), (-3.5771483247, -8.636), (3.5771483247, -8.636), (8.636, -3.5771483247), (8.636, 3.5771483247), (3.5771483247, 8.636), (-3.5771483247, 8.636), align=None)
    extrude(amount=F6_DEPTH)

    # F7
    f7_edges = [f6.edges().sort_by_distance(p)[0] for p in [
        (-15.24, 15.24, 1.5875),
        (15.24, 15.24, 1.5875),
        (15.24, -15.24, 1.5875),
        (-15.24, -15.24, 1.5875),
    ]]
    fillet(f7_edges, radius=F7_R)

    # F14
    f14_edges = [f6.edges().sort_by_distance(p)[0] for p in [
        (-13.716, -12.7, 3.175),
        (-13.716, 12.7, 3.175),
        (11.684, 12.7, 3.175),
        (11.98158, -11.98158, 3.175),
    ]]
    chamfer(f14_edges, length=F14_SIZE)


with BuildPart() as f8:
    # F1 (on Top) → F8 (new body)
    with BuildSketch(Plane.XY):
        Rectangle(F1_W, F1_H)
        with Locations((-12.7, -12.7)):
            Circle(F1_R, mode=Mode.SUBTRACT)
        with BuildLine():
            ThreePointArc((13.4184204897, -13.4184204897), (11.9815795103, -13.4184204897), (11.9815795103, -11.9815795103))
            ThreePointArc((11.9815795103, -11.9815795103), (13.0888063673, -11.761338395), (13.716, -12.7))
            ThreePointArc((13.716, -12.7), (13.638661605, -13.0888063673), (13.4184204897, -13.4184204897))
        make_face(mode=Mode.SUBTRACT)
        with Locations((-12.7, 12.7)):
            Circle(F1_R, mode=Mode.SUBTRACT)
        Rectangle(F1_W_2, F1_H_2, mode=Mode.SUBTRACT)
        with Locations((12.7, 12.7)):
            Circle(F1_R, mode=Mode.SUBTRACT)
        Rectangle(F1_W_2, F1_H_2)
        Polygon((-3.5771483247, -8.636), (-8.636, -3.5771483247), (-8.636, 3.5771483247), (-3.5771483247, 8.636), (3.5771483247, 8.636), (8.636, 3.5771483247), (8.636, -3.5771483247), (3.5771483247, -8.636), align=None, mode=Mode.SUBTRACT)
        Polygon((-8.636, 3.5771483247), (-8.636, -3.5771483247), (-3.5771483247, -8.636), (3.5771483247, -8.636), (8.636, -3.5771483247), (8.636, 3.5771483247), (3.5771483247, 8.636), (-3.5771483247, 8.636), align=None)
    extrude(amount=F8_DEPTH)


with BuildPart() as f10:
    # F9 (on face) → F10 (new body, symmetric)
    with BuildSketch(Plane(origin=(0, 0, 0), x_dir=(1, 0, 0), z_dir=(0, 0, -1))):
        Polygon((-14.4471824169, 13.7087362387), (-14.4471824169, 11.6912637613), (-12.7, 10.6825275225), (-10.9528175831, 11.6912637613), (-10.9528175831, 13.7087362387), (-12.7, 14.7174724775), align=None)
        with Locations((-12.7, 12.7)):
            Circle(F9_R, mode=Mode.SUBTRACT)
    extrude(amount=F10_DEPTH, both=True)


with BuildPart() as f11_1:
    # F11: instance of F10
    add(f10.part.rotate(Axis((0, 0, -0.5095088854), (0, 0, -1)), 1 * F11_ANGLE / (F11_COUNT - 1)))


with BuildPart() as f11_2:
    # F11: instance of F10
    add(f10.part.rotate(Axis((0, 0, -0.5095088854), (0, 0, -1)), 2 * F11_ANGLE / (F11_COUNT - 1)))


with BuildPart() as f11_3:
    # F11: instance of F10
    add(f10.part.rotate(Axis((0, 0, -0.5095088854), (0, 0, -1)), 3 * F11_ANGLE / (F11_COUNT - 1)))


with BuildPart() as f8_1:
    add(f8.part)

    # F12: cut F10, F11_1, F11_2, F11_3
    add(f10.part, mode=Mode.SUBTRACT)
    add(f11_1.part, mode=Mode.SUBTRACT)
    add(f11_2.part, mode=Mode.SUBTRACT)
    add(f11_3.part, mode=Mode.SUBTRACT)

    # F13
    f13_edges = [f8_1.edges().sort_by_distance(p)[0] for p in [
        (15.24, -15.24, 2.54),
        (-15.24, -15.24, 2.54),
        (-15.24, 15.24, 2.54),
        (15.24, 15.24, 2.54),
    ]]
    fillet(f13_edges, radius=F13_R)


solid = Compound([f2.part, f4.part, f6.part, f8_1.part])
